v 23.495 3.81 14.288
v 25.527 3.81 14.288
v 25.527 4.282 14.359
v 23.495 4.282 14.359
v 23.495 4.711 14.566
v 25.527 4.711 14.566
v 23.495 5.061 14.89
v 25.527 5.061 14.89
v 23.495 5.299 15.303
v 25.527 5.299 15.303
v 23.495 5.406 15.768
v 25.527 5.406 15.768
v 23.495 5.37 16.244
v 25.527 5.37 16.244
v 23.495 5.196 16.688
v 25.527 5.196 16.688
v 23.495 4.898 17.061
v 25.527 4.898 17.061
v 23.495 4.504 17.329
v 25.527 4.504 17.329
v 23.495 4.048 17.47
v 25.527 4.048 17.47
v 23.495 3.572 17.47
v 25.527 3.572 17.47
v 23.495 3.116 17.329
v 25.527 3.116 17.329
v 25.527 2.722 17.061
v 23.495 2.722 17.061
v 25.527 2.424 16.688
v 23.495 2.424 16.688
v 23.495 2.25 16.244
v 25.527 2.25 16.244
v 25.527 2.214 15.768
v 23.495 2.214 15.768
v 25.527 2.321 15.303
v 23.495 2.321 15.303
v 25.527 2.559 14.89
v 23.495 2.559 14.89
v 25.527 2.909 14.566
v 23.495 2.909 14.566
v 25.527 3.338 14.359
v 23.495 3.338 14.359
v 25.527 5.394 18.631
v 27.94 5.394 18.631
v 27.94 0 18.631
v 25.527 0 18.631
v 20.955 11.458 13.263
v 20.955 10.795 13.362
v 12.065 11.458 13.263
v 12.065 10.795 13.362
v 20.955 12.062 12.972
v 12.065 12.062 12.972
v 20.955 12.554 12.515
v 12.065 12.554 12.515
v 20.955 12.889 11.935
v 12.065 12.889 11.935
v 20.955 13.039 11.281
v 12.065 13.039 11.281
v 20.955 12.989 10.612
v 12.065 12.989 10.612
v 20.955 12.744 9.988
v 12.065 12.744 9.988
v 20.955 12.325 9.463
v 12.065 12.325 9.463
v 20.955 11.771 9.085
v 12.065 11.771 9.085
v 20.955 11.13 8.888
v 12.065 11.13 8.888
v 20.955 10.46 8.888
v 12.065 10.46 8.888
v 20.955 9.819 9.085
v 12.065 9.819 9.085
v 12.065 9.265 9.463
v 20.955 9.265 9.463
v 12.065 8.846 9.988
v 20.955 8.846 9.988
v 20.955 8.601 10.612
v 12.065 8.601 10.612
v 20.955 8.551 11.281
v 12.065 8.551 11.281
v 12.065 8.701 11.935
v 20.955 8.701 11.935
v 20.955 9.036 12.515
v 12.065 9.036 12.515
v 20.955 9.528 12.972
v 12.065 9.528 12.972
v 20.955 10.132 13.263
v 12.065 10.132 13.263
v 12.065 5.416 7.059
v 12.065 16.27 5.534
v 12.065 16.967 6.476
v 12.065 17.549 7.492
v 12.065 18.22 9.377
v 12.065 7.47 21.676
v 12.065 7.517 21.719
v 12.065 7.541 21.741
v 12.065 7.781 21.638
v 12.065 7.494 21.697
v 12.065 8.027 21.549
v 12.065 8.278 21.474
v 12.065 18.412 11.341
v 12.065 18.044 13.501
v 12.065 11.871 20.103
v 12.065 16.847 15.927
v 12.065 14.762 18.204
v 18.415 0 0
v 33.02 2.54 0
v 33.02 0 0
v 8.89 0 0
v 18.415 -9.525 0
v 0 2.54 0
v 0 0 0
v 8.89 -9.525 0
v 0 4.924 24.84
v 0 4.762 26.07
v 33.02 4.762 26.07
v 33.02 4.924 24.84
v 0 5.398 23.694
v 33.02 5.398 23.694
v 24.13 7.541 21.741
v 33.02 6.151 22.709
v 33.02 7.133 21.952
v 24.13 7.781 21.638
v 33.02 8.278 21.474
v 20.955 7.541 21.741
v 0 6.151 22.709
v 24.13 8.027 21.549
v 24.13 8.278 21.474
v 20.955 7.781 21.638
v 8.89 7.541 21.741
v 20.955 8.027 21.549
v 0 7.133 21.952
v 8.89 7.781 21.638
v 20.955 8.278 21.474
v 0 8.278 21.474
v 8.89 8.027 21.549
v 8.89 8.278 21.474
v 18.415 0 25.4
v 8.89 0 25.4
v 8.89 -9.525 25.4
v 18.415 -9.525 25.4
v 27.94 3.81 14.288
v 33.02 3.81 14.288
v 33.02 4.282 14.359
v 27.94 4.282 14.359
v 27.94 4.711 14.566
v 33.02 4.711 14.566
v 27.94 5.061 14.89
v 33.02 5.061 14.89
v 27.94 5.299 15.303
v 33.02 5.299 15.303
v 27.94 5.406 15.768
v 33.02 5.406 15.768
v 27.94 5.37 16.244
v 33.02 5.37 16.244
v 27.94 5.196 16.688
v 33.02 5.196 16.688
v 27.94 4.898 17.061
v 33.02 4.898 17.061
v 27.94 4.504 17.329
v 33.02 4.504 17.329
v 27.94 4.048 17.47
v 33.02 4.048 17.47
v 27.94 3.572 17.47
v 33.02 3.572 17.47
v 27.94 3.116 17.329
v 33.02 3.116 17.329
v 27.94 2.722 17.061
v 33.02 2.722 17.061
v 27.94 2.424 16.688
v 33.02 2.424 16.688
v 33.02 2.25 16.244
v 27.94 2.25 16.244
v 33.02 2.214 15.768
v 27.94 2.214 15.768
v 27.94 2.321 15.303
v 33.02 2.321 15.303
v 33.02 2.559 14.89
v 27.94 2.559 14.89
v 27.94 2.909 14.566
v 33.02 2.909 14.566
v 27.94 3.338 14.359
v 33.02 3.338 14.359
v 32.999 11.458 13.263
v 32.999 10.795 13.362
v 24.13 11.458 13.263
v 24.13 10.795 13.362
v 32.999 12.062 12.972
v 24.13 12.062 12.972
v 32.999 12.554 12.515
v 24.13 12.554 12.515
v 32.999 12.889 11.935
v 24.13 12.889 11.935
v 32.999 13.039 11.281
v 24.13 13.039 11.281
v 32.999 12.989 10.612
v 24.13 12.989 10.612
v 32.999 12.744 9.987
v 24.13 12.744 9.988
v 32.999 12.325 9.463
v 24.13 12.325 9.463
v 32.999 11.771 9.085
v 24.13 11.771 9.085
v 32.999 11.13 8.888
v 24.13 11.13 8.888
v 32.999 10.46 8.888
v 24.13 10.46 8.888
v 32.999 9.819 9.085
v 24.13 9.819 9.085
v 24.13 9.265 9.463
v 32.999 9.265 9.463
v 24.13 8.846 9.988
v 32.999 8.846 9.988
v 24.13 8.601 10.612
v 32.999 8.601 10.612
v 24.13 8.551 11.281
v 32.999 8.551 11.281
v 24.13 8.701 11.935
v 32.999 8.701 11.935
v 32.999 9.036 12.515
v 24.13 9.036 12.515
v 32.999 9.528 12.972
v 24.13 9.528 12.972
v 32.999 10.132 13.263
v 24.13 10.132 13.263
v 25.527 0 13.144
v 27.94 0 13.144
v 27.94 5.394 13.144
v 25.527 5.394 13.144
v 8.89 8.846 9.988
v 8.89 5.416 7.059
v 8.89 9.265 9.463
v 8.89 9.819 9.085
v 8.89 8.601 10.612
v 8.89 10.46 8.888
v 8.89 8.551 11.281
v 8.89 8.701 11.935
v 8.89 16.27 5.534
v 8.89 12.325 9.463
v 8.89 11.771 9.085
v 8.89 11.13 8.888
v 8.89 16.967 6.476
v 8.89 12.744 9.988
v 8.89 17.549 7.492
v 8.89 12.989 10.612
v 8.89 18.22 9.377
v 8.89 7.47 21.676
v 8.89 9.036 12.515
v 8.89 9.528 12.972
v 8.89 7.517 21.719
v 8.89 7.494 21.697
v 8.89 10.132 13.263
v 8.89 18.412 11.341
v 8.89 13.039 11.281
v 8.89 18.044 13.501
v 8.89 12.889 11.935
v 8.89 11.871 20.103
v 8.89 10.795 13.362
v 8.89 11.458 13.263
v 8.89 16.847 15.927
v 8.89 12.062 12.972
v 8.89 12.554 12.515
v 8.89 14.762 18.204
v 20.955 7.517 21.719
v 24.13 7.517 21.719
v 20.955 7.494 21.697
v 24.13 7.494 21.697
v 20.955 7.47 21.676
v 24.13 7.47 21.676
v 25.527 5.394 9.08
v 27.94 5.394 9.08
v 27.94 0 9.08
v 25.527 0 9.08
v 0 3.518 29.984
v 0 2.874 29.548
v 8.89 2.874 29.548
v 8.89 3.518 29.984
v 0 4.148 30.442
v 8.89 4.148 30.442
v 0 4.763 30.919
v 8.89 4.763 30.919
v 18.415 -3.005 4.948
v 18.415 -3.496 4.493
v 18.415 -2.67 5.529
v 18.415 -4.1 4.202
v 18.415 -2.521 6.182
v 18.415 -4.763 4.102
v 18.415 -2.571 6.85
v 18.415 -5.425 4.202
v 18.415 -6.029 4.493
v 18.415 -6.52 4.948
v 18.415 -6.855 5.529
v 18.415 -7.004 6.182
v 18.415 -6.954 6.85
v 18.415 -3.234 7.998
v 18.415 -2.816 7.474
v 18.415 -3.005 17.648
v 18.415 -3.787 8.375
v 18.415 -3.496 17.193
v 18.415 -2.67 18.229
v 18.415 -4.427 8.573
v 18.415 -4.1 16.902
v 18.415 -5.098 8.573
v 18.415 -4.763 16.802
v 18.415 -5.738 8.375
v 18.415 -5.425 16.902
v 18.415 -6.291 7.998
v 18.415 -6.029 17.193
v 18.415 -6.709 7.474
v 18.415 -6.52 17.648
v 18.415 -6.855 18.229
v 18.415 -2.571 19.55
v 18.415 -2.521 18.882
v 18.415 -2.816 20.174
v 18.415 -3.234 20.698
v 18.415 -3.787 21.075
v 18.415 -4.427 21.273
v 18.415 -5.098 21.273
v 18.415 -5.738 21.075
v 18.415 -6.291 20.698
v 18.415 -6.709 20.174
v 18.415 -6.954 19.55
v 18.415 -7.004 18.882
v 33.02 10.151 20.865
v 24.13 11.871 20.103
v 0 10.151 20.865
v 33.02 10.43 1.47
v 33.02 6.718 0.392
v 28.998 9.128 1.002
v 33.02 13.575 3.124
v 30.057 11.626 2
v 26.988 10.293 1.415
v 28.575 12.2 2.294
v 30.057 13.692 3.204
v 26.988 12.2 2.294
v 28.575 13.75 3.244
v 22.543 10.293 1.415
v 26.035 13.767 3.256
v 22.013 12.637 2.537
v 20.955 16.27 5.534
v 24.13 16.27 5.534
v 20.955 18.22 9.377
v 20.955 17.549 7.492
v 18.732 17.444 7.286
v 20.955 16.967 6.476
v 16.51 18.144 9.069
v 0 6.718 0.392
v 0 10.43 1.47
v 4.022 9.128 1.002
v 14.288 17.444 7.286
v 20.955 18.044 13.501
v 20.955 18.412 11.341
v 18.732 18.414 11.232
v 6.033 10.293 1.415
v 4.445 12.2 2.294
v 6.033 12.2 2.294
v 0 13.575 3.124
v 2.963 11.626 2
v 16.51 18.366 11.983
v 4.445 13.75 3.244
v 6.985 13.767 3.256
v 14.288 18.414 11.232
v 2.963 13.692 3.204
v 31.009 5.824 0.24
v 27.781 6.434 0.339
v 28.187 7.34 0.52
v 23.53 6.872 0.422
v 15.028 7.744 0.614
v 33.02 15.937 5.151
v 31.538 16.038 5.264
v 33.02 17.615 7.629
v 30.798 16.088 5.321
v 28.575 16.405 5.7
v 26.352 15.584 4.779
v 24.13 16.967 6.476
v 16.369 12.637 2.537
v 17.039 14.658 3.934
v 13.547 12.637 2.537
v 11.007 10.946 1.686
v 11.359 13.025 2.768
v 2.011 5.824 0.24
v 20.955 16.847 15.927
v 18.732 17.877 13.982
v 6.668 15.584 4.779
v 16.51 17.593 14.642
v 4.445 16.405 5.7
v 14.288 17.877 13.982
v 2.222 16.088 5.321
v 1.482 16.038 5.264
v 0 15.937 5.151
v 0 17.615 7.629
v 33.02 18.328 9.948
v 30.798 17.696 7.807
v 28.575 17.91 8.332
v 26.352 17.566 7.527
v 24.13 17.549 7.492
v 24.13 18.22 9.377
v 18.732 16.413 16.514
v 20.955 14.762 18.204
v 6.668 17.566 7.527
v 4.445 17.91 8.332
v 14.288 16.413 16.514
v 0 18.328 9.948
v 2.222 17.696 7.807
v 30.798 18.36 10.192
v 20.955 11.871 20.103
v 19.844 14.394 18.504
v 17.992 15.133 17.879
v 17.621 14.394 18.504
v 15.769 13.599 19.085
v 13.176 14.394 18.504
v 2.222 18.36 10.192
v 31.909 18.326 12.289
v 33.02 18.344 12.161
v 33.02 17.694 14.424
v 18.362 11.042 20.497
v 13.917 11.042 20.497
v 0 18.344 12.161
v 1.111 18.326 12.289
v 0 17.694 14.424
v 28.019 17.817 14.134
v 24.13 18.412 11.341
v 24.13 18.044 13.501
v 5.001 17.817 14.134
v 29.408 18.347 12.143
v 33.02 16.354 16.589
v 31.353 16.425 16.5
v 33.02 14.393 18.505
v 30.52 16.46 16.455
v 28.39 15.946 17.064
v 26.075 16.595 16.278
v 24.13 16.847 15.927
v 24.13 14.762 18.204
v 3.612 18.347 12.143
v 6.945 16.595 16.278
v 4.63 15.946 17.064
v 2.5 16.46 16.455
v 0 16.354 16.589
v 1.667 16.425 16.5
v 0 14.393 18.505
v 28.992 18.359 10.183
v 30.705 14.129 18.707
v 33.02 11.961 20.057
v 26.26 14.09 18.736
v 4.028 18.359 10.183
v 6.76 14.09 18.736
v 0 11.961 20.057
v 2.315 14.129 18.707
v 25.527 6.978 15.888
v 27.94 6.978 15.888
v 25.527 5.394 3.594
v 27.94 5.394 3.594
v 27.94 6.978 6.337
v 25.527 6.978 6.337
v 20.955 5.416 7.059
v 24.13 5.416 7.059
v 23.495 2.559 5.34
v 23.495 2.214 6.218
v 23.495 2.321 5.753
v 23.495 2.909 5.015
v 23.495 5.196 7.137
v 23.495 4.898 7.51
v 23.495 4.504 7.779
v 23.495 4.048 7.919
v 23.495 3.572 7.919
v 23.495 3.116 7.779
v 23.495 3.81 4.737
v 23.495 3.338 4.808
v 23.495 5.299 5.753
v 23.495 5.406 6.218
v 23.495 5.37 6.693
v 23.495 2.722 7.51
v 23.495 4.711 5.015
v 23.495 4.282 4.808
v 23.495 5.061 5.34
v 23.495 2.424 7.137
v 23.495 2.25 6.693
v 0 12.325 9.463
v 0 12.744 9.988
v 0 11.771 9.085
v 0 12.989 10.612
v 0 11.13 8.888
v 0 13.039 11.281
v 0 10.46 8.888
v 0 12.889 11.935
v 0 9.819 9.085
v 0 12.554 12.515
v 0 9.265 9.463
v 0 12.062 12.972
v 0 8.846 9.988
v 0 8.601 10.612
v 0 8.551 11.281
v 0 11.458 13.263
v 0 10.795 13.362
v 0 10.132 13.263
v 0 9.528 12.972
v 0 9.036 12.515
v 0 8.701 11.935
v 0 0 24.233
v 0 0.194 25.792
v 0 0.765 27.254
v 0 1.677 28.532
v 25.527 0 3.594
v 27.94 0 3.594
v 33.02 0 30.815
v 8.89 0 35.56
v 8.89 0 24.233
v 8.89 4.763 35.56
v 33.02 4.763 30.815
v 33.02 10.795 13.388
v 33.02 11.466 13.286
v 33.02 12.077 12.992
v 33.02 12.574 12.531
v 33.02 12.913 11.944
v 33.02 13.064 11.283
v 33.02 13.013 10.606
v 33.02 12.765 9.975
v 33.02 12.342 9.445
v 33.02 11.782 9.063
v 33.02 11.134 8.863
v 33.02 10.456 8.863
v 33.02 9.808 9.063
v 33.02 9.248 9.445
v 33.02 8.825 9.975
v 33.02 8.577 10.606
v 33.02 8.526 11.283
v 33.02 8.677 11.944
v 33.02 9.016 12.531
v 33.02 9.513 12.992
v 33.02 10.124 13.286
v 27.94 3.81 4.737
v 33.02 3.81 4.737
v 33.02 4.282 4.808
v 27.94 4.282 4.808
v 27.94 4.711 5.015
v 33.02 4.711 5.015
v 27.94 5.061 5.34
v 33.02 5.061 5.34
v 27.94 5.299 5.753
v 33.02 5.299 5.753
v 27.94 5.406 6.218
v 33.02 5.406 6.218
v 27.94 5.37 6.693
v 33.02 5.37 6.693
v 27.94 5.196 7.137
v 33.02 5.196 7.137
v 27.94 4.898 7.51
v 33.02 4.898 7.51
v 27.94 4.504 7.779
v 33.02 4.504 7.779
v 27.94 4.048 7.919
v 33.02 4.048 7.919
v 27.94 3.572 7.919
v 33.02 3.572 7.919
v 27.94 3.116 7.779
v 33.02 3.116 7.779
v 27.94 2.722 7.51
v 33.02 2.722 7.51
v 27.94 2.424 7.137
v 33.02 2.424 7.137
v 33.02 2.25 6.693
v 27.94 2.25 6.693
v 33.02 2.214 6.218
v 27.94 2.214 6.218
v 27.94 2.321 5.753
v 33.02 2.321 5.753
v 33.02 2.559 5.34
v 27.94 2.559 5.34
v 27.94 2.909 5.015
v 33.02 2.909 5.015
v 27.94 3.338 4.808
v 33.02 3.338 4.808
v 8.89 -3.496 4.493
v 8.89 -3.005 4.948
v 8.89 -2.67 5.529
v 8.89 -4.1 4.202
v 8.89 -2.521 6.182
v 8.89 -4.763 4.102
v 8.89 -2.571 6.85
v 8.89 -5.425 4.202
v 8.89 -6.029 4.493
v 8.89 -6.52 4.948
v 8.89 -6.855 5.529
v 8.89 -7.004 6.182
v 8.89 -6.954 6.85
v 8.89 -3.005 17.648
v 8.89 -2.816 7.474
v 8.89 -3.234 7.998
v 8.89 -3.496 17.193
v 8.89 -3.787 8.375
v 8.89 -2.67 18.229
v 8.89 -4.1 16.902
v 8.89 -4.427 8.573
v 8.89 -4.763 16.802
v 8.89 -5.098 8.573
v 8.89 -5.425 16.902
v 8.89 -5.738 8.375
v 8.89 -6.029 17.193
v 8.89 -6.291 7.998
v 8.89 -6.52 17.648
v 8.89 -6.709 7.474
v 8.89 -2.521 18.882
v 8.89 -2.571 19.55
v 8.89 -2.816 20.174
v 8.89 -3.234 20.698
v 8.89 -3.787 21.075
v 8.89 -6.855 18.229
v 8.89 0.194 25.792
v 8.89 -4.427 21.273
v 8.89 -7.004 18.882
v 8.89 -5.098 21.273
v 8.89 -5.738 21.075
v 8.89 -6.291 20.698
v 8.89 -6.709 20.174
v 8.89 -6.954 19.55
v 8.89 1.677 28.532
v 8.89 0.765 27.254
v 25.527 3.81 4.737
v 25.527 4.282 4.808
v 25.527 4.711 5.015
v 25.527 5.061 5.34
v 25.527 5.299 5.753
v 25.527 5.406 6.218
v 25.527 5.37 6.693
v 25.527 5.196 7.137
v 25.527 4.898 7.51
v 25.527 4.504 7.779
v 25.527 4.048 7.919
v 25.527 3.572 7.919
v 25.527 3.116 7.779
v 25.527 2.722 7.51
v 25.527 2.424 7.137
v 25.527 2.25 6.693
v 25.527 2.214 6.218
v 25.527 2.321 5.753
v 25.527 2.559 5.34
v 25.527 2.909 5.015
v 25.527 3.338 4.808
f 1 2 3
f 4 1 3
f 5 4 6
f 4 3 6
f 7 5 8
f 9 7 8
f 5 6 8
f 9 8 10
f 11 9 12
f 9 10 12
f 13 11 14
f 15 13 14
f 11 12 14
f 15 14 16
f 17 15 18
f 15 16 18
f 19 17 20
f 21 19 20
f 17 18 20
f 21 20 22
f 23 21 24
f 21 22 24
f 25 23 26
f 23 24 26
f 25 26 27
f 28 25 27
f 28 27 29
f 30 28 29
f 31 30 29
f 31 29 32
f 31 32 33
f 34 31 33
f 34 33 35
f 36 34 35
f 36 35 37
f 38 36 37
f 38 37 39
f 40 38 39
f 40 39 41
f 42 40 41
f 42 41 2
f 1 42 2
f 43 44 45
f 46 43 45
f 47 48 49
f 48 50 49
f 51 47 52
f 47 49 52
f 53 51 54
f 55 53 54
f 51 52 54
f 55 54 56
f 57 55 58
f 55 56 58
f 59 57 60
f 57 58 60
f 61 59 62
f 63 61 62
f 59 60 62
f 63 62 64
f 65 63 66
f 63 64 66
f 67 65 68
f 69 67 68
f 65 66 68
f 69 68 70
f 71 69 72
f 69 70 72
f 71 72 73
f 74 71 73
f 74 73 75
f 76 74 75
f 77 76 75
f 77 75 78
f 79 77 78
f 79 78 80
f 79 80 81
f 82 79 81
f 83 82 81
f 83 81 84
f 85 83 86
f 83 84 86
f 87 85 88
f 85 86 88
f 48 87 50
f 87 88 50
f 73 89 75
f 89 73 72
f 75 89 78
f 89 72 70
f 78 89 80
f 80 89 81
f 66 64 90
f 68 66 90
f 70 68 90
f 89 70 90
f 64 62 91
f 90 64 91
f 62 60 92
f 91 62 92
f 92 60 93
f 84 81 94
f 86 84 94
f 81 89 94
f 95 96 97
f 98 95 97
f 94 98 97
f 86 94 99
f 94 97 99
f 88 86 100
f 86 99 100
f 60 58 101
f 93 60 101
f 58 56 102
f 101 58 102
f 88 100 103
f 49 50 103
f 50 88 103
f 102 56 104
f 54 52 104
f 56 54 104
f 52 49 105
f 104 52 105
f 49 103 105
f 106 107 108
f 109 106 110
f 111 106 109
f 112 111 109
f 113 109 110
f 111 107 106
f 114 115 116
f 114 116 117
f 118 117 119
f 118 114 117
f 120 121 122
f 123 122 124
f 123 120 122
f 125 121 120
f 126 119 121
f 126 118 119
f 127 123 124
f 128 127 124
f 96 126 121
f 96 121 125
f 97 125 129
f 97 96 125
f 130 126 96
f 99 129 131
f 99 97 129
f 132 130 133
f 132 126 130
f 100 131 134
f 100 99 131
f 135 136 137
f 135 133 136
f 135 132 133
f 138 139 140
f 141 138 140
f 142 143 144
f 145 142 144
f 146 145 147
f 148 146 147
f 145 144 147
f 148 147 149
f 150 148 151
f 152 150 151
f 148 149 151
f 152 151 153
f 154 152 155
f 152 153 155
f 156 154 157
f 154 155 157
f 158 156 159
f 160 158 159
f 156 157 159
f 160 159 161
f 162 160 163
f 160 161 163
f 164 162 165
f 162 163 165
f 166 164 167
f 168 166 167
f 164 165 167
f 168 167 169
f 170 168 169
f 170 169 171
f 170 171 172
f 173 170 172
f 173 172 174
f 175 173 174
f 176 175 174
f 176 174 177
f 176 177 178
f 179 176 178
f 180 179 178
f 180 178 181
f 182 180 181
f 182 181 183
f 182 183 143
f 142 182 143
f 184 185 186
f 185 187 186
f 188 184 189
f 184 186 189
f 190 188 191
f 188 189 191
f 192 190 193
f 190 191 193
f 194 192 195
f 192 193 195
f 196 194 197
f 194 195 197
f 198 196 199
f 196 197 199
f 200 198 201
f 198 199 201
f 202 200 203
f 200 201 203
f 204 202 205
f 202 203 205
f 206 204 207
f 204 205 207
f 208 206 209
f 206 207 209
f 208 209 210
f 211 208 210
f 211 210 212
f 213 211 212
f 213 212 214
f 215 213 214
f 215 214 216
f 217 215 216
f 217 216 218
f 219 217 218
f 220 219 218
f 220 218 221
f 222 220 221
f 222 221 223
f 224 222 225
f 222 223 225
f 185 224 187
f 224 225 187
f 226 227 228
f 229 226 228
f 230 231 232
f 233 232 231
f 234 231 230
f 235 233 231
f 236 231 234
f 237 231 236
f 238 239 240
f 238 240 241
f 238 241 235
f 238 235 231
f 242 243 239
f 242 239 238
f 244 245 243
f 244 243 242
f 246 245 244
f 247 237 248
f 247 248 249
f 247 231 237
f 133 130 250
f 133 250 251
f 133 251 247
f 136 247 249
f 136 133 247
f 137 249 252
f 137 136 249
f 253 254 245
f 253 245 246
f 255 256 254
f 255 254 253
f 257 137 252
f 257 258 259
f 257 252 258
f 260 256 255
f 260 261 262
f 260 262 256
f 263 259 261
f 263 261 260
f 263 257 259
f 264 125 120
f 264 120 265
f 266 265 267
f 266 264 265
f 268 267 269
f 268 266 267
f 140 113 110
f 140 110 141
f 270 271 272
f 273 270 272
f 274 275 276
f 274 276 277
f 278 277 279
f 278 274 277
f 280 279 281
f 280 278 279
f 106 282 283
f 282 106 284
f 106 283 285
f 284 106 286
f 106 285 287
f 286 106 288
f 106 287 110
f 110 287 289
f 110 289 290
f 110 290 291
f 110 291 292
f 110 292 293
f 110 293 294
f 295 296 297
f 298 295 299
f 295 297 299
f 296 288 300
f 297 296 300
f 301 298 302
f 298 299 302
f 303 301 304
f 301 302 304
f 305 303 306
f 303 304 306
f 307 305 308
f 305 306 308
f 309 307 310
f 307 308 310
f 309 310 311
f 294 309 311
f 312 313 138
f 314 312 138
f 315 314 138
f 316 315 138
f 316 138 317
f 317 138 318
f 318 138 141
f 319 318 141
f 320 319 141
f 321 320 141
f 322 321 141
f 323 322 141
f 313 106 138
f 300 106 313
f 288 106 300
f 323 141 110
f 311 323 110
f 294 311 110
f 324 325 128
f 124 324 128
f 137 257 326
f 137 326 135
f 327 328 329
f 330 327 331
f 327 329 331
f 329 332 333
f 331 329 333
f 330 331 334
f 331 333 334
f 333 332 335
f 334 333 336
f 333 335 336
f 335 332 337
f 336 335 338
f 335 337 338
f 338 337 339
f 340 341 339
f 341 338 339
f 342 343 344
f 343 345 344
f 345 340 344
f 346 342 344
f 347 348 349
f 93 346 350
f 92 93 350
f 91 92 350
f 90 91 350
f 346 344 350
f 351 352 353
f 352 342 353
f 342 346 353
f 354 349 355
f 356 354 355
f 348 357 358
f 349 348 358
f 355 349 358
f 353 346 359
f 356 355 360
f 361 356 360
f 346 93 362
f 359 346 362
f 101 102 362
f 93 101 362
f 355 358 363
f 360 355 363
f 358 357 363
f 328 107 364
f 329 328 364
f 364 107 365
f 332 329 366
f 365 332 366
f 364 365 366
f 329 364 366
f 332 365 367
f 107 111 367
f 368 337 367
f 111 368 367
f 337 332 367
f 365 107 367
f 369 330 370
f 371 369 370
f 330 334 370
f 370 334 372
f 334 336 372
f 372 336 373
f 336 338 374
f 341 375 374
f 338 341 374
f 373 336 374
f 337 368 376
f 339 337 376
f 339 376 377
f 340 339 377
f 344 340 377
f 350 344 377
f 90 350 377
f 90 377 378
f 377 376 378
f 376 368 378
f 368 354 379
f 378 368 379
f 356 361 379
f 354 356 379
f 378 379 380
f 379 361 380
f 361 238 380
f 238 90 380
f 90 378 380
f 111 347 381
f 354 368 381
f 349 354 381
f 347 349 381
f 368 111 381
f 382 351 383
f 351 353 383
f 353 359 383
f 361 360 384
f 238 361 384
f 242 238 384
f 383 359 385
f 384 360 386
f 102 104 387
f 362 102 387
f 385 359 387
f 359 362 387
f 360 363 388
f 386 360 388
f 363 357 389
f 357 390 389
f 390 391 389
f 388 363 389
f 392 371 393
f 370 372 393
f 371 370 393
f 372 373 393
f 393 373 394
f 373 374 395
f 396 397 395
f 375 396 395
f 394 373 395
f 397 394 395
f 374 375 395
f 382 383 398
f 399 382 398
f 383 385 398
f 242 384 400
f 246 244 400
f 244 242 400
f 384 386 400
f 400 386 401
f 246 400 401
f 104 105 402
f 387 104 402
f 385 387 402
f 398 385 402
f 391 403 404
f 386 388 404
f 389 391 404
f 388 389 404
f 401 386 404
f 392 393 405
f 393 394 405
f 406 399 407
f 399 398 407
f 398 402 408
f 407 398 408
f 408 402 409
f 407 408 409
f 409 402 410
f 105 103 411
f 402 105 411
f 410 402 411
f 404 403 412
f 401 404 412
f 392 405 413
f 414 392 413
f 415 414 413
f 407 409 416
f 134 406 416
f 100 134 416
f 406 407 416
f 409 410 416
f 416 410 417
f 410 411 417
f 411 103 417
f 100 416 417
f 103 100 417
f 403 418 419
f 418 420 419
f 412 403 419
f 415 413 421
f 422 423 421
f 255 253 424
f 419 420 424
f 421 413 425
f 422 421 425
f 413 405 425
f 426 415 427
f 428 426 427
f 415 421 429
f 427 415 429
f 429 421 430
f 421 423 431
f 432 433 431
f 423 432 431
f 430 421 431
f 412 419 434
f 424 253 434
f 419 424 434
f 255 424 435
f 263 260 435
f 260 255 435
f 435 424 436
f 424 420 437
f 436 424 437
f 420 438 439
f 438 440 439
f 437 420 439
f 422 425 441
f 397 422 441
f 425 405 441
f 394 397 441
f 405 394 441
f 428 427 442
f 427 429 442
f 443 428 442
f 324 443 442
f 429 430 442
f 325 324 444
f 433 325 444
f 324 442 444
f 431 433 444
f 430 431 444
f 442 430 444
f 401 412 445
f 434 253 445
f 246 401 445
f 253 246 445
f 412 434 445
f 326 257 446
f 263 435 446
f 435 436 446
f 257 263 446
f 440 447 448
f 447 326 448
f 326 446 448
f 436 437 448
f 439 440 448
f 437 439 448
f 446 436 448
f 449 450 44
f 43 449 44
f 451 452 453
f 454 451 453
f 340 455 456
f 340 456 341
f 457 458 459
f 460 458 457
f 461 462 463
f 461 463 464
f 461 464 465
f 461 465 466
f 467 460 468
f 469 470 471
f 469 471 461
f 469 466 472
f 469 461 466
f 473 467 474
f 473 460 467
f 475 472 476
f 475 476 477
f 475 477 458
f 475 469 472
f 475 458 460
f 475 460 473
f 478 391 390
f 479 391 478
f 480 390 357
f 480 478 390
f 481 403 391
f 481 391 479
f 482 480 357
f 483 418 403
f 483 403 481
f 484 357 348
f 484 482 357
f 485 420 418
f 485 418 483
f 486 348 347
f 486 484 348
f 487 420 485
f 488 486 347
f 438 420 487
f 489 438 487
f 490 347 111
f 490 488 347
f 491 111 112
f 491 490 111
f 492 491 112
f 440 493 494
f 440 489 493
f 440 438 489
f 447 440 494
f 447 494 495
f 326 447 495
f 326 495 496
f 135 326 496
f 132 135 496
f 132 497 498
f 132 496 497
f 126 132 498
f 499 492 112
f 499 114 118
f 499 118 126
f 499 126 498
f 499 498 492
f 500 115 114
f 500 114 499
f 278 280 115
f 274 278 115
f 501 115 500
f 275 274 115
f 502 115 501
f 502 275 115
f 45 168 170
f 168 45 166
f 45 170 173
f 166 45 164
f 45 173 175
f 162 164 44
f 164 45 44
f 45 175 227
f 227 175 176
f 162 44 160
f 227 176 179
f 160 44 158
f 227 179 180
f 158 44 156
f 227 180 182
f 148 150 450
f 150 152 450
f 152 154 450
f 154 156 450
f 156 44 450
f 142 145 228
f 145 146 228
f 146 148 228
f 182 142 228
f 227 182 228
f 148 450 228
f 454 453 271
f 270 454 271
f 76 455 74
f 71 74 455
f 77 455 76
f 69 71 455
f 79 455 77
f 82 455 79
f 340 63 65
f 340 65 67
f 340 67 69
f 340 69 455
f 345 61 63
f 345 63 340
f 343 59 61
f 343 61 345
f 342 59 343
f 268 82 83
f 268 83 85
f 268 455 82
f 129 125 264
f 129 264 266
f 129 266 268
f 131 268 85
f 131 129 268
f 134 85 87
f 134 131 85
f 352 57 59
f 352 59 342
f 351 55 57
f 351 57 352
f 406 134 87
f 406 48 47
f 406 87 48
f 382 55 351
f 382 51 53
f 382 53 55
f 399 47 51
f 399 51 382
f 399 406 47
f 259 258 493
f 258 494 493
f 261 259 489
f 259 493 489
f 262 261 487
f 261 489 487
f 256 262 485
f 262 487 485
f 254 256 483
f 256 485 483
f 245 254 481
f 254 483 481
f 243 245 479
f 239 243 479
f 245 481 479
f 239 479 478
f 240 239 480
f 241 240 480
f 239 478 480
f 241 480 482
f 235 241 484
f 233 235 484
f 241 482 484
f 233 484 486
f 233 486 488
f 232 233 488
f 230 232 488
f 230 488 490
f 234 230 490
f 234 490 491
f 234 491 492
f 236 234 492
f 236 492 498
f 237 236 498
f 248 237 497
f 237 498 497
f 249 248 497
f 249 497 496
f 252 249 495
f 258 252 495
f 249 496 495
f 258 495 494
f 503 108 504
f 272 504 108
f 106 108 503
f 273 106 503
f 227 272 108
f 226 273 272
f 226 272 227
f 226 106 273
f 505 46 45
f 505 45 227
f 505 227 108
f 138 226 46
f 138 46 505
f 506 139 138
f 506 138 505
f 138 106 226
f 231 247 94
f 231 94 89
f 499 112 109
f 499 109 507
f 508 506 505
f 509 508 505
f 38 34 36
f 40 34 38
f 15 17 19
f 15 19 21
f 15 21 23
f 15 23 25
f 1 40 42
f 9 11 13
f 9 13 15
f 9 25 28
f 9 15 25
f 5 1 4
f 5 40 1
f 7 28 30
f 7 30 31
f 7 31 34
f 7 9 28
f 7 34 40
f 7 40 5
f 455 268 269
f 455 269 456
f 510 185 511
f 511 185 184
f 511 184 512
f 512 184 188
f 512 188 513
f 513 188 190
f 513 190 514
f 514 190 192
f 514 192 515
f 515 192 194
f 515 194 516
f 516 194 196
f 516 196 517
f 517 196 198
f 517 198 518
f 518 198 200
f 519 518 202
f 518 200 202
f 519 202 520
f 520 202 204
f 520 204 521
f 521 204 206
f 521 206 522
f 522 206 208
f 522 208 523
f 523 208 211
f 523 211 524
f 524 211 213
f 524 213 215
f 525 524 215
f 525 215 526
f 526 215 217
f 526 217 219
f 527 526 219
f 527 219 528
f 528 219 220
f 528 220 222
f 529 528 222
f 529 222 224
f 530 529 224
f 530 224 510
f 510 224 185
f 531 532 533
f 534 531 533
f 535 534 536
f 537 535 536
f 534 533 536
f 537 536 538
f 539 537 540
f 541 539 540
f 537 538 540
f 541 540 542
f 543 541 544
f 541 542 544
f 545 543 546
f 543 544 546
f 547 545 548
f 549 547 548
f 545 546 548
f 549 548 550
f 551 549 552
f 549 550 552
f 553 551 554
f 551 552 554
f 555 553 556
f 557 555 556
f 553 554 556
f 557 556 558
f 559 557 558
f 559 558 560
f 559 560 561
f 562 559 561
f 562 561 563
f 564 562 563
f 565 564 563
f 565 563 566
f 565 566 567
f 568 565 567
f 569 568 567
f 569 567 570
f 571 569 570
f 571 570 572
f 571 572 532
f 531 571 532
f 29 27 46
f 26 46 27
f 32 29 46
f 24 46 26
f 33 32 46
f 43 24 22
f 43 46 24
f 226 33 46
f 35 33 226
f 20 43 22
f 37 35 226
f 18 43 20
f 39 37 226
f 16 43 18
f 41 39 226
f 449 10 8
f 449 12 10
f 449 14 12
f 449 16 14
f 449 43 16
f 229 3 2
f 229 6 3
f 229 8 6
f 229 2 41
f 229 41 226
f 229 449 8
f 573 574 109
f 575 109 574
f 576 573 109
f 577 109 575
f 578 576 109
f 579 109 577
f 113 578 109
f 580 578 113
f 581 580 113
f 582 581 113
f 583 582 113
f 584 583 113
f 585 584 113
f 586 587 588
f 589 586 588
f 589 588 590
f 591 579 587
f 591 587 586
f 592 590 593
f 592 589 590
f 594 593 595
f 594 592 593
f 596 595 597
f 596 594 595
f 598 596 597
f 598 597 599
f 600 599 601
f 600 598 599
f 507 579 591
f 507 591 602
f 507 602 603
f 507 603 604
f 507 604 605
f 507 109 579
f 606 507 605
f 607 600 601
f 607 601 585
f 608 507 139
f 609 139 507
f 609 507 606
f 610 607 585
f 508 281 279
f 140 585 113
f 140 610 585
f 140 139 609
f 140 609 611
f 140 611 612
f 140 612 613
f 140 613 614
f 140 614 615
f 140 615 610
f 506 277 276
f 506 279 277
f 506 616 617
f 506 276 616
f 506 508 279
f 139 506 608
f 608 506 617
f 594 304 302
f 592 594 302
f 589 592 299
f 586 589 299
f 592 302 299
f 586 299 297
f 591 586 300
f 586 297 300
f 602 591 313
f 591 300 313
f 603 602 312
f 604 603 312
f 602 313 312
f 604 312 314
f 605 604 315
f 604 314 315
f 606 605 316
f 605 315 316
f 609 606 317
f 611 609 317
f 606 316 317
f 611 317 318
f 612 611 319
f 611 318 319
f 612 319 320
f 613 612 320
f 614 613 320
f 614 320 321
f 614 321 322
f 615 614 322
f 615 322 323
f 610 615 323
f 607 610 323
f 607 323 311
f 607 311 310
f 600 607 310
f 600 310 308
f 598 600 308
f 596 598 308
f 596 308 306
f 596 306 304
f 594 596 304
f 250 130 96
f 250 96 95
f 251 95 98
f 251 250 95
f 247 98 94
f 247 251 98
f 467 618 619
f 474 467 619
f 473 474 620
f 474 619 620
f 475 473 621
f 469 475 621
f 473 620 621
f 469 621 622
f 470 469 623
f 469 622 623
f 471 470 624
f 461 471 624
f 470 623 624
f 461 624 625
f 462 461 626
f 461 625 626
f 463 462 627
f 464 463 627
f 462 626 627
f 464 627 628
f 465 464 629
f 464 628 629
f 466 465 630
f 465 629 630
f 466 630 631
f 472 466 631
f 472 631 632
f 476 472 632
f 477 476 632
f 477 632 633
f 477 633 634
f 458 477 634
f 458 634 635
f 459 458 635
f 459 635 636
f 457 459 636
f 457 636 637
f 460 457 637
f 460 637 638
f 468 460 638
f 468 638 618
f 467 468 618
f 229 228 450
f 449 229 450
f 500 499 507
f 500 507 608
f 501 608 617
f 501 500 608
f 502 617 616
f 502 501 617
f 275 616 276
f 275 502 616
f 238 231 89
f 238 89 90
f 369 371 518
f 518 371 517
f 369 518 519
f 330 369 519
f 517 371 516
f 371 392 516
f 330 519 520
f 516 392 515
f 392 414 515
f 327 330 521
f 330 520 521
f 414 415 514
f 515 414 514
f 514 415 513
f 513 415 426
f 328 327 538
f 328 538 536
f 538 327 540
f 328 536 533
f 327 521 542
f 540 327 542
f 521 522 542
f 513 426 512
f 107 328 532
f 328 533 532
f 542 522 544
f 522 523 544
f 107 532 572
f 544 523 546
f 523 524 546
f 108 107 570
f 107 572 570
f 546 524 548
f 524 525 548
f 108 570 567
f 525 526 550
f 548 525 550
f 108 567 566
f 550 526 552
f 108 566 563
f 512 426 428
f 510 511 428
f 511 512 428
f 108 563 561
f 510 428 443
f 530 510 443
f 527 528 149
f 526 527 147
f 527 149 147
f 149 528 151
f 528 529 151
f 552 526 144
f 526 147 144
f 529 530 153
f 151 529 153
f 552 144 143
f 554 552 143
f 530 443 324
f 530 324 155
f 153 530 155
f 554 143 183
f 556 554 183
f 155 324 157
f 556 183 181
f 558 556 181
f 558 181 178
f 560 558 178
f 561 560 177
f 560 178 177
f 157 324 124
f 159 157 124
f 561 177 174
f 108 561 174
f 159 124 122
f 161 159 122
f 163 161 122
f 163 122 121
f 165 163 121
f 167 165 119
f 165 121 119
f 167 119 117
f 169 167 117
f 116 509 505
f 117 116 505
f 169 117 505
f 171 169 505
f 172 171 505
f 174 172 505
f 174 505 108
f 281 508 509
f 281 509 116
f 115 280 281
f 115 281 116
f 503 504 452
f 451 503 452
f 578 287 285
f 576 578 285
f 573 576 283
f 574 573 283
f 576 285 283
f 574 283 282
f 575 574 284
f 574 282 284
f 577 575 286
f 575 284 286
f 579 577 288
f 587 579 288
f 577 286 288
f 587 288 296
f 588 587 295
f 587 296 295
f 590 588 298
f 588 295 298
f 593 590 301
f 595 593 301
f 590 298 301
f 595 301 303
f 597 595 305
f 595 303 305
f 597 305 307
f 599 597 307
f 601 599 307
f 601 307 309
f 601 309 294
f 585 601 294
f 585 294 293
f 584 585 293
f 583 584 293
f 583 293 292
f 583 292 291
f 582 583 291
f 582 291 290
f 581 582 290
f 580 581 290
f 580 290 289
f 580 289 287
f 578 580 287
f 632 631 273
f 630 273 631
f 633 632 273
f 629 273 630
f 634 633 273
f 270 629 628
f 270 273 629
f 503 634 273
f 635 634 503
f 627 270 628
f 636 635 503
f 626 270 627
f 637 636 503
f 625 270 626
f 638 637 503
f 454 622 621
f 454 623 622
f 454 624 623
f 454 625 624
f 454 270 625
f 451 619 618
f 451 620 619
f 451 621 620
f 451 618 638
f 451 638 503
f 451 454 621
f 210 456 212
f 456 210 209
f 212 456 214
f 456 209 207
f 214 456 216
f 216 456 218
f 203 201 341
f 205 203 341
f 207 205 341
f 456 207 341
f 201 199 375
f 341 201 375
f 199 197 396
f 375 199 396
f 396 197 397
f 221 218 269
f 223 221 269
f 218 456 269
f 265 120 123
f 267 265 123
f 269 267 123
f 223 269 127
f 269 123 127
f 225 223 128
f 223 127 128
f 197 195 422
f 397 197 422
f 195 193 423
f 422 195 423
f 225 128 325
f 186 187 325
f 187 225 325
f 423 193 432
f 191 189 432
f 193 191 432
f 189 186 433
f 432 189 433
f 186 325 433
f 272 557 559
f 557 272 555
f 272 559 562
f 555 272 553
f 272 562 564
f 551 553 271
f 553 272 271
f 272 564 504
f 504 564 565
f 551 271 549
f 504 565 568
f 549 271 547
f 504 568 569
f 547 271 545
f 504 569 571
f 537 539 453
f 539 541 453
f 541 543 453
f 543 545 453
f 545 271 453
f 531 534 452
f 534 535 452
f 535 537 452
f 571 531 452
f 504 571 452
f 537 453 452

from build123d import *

# Parameters (mm, degrees)
BOSS_EXTRUDE1_DEPTH            = 33.02
M4_CLEARANCE_HOLE1_D           = 4.5
M4_CLEARANCE_HOLE1_CSINK_D     = 4.55
M4_CLEARANCE_HOLE1_CSINK_ANGLE = 100
SKETCH5_W                      = 9.525
SKETCH5_H                      = 25.4
BOSS_EXTRUDE2_DEPTH            = 9.525
F_8_CLEARANCE_HOLE1_D          = 4.4958
CUT_EXTRUDE1_DEPTH             = 51.586230043
CUT_EXTRUDE1_DEPTH_BACK        = 51.586230043
CUT_EXTRUDE3_DEPTH             = 3.175
LPATTERN1_COUNT                = 2
LPATTERN1_PITCH                = 12.065
CUT_EXTRUDE4_DEPTH             = 2.413
SKETCH13_R                     = 1.599999975
CUT_EXTRUDE5_DEPTH             = 9.525
CUT_EXTRUDE6_DEPTH             = 8.89
CUT_EXTRUDE6_DEPTH_BACK        = 51.586230043


with BuildPart() as part:
    # Sketch1 → Boss-Extrude1 (new body)
    with BuildSketch(Plane.YZ):
        with BuildLine():
            Line((0, 0), (0, 35.56))
            Line((0, 35.56), (4.7625, 35.56))
            Line((4.7625, 35.56), (4.7625, 26.070051643))
            ThreePointArc((4.7625, 26.070051643), (5.742064598, 23.176817123), (8.277799105, 21.473760076))
            add(Edge.make_bspline(
                [(2.54, 0), (15.72103374, 0), (18.14439364, 9.069444242), (20.567753539, 18.138888484), (8.277799105, 21.473760076)],
                knots=[1.570796327, 1.570796327, 1.570796327, 2.95668879, 2.95668879, 4.342581253, 4.342581253, 4.342581253], degree=2, weights=[1, 0.769367284, 1, 0.769367284, 1]))
            Line((2.54, 0), (0, 0))
        make_face()
    extrude(amount=BOSS_EXTRUDE1_DEPTH)

    # M4 Clearance Hole1 (through all)
    with Locations(Plane(origin=(33.02, 0, 0), x_dir=(0, 0, -1), z_dir=(1, 0, 0))):
        with Locations((-11.1125, 10.795)):
            CounterSinkHole(M4_CLEARANCE_HOLE1_D / 2, M4_CLEARANCE_HOLE1_CSINK_D / 2, counter_sink_angle=M4_CLEARANCE_HOLE1_CSINK_ANGLE)

    # Sketch5 → Boss-Extrude2 (add)
    with BuildSketch(Plane(origin=(8.89, 0, 0), x_dir=(0, -1, 0), z_dir=(-1, 0, 0))):
        with Locations((4.7625, 12.7)):
            Rectangle(SKETCH5_W, SKETCH5_H)
    extrude(amount=-BOSS_EXTRUDE2_DEPTH)

    # #8 Clearance Hole1 (through all)
    with Locations(Plane.ZY):
        with Locations((6.35, -4.7625), (19.05, -4.7625)):
            Hole(F_8_CLEARANCE_HOLE1_D / 2)

    # Sketch8 → Cut-Extrude1 (cut, two sides: drawn at the far end of the back side and taken through both)
    with BuildSketch(Plane(origin=(0, 4.7625, 0), x_dir=(-1, 0, 0), z_dir=(0, 1, 0)).offset(-CUT_EXTRUDE1_DEPTH_BACK)):
        Polygon((-33.02, 35.56), (-8.89, 35.56), (-33.02, 30.815025822), align=None)
    extrude(amount=CUT_EXTRUDE1_DEPTH + CUT_EXTRUDE1_DEPTH_BACK, mode=Mode.SUBTRACT)

    # Sketch9 → Cut-Extrude3 (cut)
    with BuildSketch(Plane.YZ.offset(8.89)):
        with BuildLine():
            Line((7.470230181, 21.675508242), (5.416036429, 7.059160216))
            Line((5.416036429, 7.059160216), (16.269581823, 5.533793887))
            ThreePointArc((16.269581823, 5.533793887), (22.282600027, 19.280935147), (7.470230181, 21.675508242))
        make_face()
    cut_extrude3 = extrude(amount=CUT_EXTRUDE3_DEPTH, mode=Mode.SUBTRACT)

    # LPattern1: Cut-Extrude3 ×2
    with Locations(*[(i * LPATTERN1_PITCH, 0, 0) for i in range(1, LPATTERN1_COUNT)]):
        add(cut_extrude3, mode=Mode.SUBTRACT)

    # Sketch12 → Cut-Extrude4 (cut)
    with BuildSketch(Plane(origin=(27.94, 0, 0), x_dir=(0, 0, -1), z_dir=(1, 0, 0))):
        Polygon((-18.6309, 2.226212742), (-18.6309, 0), (-13.1445, 0), (-13.1445, 2.226212742), (-15.8877, 0.642425483), align=None)
        Polygon((-18.6309, 5.393787258), (-18.6309, 3.81), (-13.1445, 3.81), (-13.1445, 5.393787258), (-15.8877, 6.977574517), align=None)
        Polygon((-9.0805, 3.81), (-3.5941, 3.81), (-3.5941, 5.393787258), (-6.3373, 6.977574517), (-9.0805, 5.393787258), align=None)
        Polygon((-6.3373, 0.642425483), (-3.5941, 2.226212742), (-3.5941, 3.81), (-9.0805, 3.81), (-9.0805, 2.226212742), align=None)
        Polygon((-9.0805, 0), (-3.5941, 0), (-3.5941, 2.226212742), (-6.3373, 0.642425483), (-9.0805, 2.226212742), align=None)
        Polygon((-18.6309, 3.81), (-18.6309, 2.226212742), (-15.8877, 0.642425483), (-13.1445, 2.226212742), (-13.1445, 3.81), align=None)
    extrude(amount=-CUT_EXTRUDE4_DEPTH, mode=Mode.SUBTRACT)

    # Sketch13 → Cut-Extrude5 (cut)
    with BuildSketch(Plane.YZ.offset(33.02)):
        with Locations(Location((3.81, 15.8877, 0), (0, 0, 270))):
            Circle(SKETCH13_R)
        with Locations(Location((3.81, 6.3373, 0), (0, 0, 270))):
            Circle(SKETCH13_R)
    extrude(amount=-CUT_EXTRUDE5_DEPTH, mode=Mode.SUBTRACT)

    # Sketch15 → Cut-Extrude6 (cut, two sides: drawn at the far end of the back side and taken through both)
    with BuildSketch(Plane(origin=(0, 4.7625, 0), x_dir=(0, 1, 0), z_dir=(1, 0, 0)).offset(-CUT_EXTRUDE6_DEPTH_BACK)):
        with BuildLine():
            Line((-14.2875, 27.94), (-4.7625, 27.94))
            Line((-4.7625, 27.94), (-4.7625, 35.56))
            Line((-4.7625, 35.56), (0, 35.56))
            Line((0, 35.56), (0, 30.919456431))
            ThreePointArc((0, 30.919456431), (6.552801948, 39.188062352), (8.89, 49.47623821))
            ThreePointArc((8.89, 49.47623821), (-31.98350955, 66.08819503), (-14.2875, 25.672206383))
            Line((-14.2875, 25.672206383), (-14.2875, 27.94))
        make_face()
        with BuildLine():
            Line((-4.7625, 35.56), (-4.7625, 27.94))
            ThreePointArc((-4.7625, 27.94), (-3.297566963, 28.694128401), (-1.888289474, 29.547753265))
            ThreePointArc((-1.888289474, 29.547753265), (-0.927329109, 30.21045642), (0, 30.919456431))
            Line((0, 30.919456431), (0, 35.56))
            Line((0, 35.56), (-4.7625, 35.56))
        make_face()
        with BuildLine():
            Line((-4.7625, 27.94), (-4.7625, 24.233490613))
            ThreePointArc((-4.7625, 24.233490613), (-3.997916867, 27.254354467), (-1.888289474, 29.547753265))
            ThreePointArc((-1.888289474, 29.547753265), (-3.297566963, 28.694128401), (-4.7625, 27.94))
        make_face()
        with BuildLine():
            Line((-14.2875, 0), (-4.7625, 0))
            Line((-4.7625, 0), (-4.7625, 24.233490613))
            Line((-4.7625, 24.233490613), (-4.7625, 27.94))
            ThreePointArc((-4.7625, 27.94), (-9.407182401, 26.311255412), (-14.2875, 25.672206383))
            Line((-14.2875, 25.672206383), (-14.2875, 0))
        make_face()
        with BuildLine():
            ThreePointArc((-14.2875, 25.672206383), (-9.407182401, 26.311255412), (-4.7625, 27.94))
            Line((-4.7625, 27.94), (-14.2875, 27.94))
            Line((-14.2875, 27.94), (-14.2875, 25.672206383))
        make_face()
    extrude(amount=CUT_EXTRUDE6_DEPTH + CUT_EXTRUDE6_DEPTH_BACK, mode=Mode.SUBTRACT)


solid = part.part
